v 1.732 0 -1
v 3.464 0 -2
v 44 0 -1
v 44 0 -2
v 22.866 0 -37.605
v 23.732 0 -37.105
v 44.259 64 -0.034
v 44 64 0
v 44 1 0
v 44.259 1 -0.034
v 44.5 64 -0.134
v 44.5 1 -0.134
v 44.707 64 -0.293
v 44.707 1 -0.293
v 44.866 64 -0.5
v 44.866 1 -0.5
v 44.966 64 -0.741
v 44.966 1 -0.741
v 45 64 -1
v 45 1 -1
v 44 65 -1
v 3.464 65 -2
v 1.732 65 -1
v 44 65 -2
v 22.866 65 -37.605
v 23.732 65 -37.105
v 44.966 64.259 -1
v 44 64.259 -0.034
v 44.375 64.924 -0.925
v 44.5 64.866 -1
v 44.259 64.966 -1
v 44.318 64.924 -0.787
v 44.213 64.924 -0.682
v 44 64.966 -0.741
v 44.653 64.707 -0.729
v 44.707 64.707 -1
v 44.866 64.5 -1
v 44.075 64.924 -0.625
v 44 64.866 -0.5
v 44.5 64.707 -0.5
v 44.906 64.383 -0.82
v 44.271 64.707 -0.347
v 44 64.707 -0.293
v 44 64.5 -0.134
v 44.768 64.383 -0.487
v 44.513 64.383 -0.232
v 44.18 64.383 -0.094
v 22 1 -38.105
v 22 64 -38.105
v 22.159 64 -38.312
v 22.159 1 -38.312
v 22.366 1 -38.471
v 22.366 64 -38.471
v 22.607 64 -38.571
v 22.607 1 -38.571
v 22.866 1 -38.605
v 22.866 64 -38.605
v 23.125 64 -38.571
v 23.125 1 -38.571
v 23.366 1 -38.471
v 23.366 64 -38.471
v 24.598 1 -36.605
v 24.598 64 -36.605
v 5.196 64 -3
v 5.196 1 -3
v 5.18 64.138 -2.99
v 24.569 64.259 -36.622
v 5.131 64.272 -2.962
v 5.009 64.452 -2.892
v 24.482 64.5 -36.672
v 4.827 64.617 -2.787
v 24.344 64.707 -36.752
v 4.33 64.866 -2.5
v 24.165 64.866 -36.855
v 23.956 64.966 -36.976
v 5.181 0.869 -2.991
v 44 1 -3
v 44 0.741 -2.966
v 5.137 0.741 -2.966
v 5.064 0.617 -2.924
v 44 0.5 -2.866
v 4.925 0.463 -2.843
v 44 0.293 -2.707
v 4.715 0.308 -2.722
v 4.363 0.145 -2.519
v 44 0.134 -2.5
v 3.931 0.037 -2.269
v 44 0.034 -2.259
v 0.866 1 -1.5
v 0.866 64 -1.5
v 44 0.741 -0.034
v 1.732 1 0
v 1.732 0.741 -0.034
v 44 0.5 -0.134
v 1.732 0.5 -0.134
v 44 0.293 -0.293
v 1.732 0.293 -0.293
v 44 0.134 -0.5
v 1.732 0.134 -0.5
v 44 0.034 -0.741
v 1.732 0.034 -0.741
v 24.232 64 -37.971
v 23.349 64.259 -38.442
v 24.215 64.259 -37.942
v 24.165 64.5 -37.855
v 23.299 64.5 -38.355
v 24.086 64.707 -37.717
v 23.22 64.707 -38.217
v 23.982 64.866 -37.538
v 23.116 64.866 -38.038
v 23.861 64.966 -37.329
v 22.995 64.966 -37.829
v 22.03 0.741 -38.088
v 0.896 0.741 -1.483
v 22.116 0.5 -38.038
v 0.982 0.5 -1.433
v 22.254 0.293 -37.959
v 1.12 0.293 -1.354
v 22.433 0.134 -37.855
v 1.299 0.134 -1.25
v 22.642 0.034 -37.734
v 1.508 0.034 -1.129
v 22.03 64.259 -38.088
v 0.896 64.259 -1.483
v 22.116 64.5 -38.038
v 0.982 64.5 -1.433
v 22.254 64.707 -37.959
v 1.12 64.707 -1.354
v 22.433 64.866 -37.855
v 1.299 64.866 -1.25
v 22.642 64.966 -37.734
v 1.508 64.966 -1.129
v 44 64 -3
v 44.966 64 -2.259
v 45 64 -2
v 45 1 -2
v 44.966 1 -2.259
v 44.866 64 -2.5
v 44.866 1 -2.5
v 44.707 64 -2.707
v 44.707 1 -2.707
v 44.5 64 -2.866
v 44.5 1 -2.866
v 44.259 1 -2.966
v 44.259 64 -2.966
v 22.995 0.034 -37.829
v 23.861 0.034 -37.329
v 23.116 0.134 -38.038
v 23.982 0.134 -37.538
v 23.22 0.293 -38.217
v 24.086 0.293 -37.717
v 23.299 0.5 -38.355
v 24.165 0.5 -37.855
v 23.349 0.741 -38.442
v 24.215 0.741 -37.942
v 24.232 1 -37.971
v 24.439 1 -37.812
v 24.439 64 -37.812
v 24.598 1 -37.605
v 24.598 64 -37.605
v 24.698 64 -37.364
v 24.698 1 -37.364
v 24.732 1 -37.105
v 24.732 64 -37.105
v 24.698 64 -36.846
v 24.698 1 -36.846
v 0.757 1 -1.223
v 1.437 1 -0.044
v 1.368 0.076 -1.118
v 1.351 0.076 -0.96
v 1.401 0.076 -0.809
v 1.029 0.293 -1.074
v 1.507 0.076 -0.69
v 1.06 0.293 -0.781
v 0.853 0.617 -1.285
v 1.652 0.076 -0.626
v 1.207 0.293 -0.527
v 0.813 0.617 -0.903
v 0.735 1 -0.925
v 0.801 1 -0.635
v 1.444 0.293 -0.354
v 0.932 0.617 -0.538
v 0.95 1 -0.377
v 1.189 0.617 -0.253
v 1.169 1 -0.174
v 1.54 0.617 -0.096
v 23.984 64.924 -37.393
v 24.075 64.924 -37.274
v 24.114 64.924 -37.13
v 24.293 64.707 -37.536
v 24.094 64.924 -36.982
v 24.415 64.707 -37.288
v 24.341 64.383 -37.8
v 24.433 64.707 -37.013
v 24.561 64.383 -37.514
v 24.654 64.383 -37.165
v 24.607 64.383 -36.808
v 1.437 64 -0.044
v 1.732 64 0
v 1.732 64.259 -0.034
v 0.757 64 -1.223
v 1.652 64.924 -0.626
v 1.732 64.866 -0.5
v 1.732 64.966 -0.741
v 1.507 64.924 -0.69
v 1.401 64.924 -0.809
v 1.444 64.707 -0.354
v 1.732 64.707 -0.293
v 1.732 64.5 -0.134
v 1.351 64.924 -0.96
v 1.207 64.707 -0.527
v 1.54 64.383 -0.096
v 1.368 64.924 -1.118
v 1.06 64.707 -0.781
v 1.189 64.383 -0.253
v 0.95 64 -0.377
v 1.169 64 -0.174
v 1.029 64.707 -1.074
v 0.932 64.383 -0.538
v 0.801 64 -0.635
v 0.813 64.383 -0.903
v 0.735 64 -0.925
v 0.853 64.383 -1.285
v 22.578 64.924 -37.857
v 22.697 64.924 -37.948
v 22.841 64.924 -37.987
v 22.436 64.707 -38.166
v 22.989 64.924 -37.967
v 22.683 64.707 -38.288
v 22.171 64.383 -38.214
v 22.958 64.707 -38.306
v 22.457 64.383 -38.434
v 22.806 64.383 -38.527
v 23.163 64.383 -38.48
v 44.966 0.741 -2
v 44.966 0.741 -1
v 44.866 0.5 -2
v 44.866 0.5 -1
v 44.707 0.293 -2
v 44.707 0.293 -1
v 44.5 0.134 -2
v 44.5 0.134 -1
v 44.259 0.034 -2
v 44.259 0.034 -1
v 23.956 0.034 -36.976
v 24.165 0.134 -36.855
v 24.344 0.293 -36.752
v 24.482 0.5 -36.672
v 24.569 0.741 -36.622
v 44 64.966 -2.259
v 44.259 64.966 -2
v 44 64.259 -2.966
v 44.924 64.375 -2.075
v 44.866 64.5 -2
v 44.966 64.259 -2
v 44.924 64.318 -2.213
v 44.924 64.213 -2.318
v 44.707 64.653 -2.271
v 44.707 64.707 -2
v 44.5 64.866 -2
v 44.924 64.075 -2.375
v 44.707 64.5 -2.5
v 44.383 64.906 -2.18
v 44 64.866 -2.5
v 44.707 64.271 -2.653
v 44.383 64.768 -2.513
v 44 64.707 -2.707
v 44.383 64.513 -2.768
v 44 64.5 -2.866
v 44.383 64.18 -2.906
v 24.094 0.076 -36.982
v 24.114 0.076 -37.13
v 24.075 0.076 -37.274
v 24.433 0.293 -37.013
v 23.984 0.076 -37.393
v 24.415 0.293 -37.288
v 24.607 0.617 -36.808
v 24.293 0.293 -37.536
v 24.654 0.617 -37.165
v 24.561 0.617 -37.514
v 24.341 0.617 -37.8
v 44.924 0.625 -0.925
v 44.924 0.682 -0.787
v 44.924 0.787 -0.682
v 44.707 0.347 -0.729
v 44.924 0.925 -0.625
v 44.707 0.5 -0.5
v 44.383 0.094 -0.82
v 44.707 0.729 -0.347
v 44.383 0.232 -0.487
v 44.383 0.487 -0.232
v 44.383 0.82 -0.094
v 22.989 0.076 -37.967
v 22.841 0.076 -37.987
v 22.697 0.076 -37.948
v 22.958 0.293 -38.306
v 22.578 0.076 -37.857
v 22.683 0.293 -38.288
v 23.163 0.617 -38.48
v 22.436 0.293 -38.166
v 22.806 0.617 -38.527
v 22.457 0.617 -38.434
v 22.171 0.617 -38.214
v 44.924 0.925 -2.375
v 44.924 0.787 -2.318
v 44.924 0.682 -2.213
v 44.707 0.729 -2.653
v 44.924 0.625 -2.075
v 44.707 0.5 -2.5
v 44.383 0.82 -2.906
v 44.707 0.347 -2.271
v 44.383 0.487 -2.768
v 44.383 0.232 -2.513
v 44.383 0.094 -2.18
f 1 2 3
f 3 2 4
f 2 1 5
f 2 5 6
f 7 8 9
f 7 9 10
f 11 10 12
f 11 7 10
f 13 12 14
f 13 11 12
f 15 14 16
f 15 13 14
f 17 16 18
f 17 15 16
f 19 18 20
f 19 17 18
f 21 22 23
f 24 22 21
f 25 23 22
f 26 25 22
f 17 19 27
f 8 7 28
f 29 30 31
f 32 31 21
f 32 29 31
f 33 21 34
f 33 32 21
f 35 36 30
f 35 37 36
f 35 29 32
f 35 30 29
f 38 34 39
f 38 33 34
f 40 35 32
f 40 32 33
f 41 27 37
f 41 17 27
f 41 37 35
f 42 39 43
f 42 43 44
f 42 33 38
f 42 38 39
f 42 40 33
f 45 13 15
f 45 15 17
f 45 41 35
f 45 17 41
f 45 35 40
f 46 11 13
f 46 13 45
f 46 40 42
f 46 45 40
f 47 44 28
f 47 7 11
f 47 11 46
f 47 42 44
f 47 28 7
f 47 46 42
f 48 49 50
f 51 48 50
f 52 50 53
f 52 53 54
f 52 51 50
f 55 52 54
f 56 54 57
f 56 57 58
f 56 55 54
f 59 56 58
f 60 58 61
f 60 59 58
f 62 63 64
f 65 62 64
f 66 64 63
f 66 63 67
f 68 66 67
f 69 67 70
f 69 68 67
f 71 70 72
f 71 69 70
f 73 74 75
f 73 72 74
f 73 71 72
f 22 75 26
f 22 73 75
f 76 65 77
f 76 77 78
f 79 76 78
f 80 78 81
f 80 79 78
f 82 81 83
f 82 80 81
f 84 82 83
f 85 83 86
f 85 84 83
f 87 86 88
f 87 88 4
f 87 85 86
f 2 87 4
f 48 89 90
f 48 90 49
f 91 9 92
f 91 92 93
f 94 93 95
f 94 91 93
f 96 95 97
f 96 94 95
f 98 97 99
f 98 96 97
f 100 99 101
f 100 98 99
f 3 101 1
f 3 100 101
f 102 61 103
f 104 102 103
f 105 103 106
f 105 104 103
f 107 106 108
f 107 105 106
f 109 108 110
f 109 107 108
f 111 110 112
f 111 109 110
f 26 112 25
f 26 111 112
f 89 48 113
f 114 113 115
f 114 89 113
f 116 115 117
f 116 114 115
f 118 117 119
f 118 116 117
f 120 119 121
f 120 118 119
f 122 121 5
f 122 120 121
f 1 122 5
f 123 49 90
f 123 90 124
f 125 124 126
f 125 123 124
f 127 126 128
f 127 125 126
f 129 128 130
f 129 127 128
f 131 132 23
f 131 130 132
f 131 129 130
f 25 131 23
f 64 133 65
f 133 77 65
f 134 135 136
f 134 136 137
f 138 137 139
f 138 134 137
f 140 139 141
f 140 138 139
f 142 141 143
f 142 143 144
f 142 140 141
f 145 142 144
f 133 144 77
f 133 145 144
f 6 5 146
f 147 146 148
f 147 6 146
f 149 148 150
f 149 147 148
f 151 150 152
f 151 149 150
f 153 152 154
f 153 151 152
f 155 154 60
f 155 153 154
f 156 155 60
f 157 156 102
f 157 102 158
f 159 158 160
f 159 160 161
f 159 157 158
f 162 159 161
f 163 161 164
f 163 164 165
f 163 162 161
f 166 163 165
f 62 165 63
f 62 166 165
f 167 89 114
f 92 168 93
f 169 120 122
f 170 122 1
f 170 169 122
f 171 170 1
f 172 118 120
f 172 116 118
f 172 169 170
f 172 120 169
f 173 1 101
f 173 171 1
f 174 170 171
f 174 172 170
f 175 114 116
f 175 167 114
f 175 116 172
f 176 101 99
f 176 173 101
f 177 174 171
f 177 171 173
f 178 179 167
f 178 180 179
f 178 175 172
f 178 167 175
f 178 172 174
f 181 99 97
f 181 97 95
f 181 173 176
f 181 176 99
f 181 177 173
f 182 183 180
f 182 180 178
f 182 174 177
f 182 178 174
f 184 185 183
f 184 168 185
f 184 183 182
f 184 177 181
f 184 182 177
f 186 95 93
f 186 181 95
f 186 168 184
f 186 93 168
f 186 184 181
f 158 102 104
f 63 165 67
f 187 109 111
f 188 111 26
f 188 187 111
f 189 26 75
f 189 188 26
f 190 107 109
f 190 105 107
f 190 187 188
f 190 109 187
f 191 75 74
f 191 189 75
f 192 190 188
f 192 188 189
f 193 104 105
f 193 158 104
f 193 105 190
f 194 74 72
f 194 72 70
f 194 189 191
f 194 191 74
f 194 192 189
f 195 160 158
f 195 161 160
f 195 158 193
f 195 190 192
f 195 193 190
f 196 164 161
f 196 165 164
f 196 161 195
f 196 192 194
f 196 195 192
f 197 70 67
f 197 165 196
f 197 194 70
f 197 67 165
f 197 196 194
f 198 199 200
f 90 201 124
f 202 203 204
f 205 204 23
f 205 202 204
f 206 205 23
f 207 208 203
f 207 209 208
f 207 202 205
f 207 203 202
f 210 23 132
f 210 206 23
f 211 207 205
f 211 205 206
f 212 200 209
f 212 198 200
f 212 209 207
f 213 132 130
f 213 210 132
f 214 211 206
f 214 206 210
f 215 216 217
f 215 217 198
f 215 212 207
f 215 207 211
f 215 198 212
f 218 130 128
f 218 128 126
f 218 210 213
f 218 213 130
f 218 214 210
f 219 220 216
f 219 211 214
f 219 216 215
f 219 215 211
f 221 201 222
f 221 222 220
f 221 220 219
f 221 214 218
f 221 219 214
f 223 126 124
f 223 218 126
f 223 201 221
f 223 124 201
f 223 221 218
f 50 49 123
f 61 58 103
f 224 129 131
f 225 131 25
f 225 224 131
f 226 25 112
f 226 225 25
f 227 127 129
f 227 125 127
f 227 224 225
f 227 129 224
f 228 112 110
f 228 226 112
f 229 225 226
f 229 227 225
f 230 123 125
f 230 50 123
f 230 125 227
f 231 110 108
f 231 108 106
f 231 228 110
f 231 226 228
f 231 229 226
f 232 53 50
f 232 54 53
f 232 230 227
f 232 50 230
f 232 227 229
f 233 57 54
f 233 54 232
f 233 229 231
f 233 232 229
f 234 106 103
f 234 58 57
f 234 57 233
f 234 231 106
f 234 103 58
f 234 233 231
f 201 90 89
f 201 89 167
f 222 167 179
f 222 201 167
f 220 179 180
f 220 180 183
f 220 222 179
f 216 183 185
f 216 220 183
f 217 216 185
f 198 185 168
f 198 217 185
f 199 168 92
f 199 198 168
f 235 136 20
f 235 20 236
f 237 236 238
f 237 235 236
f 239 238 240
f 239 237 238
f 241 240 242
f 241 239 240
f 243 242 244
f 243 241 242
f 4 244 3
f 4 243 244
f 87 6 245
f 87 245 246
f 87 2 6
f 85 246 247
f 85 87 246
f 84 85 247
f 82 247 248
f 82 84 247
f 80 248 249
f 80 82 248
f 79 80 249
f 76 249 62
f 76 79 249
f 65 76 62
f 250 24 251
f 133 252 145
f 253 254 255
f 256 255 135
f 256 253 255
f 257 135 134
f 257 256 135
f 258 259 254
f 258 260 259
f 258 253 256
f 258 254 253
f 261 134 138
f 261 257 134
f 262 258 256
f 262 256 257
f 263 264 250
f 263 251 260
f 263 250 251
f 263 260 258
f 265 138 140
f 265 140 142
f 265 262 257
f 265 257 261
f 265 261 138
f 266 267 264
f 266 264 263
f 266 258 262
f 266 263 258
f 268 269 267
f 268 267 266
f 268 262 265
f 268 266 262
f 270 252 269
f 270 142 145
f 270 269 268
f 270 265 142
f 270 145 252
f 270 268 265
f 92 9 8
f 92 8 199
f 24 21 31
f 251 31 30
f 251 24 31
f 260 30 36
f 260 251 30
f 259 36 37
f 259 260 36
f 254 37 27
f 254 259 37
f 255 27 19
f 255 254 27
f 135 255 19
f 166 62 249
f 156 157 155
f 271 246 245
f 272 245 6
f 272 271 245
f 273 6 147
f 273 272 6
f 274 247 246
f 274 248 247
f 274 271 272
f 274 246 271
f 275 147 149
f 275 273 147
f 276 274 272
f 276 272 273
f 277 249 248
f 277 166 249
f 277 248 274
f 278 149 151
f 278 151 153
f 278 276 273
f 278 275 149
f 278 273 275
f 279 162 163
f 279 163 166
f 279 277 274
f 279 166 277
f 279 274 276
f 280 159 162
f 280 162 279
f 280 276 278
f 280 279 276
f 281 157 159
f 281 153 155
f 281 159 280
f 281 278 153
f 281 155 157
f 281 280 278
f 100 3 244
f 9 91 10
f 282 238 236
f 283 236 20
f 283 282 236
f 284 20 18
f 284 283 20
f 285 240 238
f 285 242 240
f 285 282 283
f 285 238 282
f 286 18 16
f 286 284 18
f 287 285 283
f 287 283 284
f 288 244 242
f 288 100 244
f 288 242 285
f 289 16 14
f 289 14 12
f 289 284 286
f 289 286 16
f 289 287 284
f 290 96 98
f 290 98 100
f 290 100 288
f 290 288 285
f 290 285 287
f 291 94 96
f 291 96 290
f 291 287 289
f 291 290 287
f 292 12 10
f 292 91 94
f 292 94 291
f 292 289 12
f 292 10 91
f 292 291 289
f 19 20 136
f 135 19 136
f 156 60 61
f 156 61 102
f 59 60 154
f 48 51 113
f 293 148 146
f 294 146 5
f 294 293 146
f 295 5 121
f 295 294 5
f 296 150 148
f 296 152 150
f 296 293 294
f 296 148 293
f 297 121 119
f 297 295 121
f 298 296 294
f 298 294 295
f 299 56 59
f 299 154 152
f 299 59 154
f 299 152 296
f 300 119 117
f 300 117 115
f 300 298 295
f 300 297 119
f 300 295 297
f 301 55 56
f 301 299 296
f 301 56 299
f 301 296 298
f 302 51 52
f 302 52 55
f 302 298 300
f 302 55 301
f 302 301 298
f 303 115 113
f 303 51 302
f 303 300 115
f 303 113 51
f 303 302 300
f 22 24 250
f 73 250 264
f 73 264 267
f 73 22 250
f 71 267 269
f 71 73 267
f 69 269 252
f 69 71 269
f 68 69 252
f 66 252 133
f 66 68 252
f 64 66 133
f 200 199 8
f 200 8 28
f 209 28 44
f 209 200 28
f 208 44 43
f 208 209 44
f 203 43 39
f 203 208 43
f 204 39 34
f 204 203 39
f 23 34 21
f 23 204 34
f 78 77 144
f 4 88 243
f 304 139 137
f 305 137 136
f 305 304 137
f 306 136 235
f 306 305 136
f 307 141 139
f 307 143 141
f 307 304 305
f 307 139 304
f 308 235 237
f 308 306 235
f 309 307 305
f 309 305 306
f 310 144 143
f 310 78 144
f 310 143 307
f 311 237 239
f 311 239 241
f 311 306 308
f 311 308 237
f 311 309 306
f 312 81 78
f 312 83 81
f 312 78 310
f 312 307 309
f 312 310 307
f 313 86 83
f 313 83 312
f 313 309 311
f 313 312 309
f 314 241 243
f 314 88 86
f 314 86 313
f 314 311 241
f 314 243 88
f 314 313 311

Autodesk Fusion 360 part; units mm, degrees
sketch "Sketch1" plane through (0, 0, 0) normal (0, 1, 0) x (1, 0, 0)
  line L0 (0, 0) -> (22.5, 38.9711)
  line L1 (0, 0) -> (45, 0) construction
  line L2 (22.5, 38.9711) -> (25.0981, 37.4711)
  line L3 (22.5, 38.9711) -> (25.5, 38.9711) construction
  line L4 (25.0981, 37.4711) -> (3.4641, 0)
  line L5 (25.0981, 37.4711) -> (68.366, 37.4711) construction
  line L6 (0, 0) -> (45, 0)
  line L7 (45, 0) -> (45, 3)
  line L8 (45, 3) -> (1.7321, 3)
  dimension "d1" = 45
  dimension "d2" = 60
  dimension "d3" = 30
  dimension "d4" = 3
  dimension "d5" = 120
  dimension "d6" = 45
  dimension "d7" = 3
extrude "Extrude1" add sketch "Sketch1" along normal blind 45
extrude "Extrude2" add 1 faces at (9.2321, 45, -13.9904) along direction (0, 1, 0) blind 20
fillet "Fillet1" radius 1 17 edges at (0, 32.5, 0) (22.5, 32.5, -38.9711) (11.25, 65, -19.4856) (11.25, 0, -19.4856) (22.5, 0, 0) (45, 32.5, 0) (22.5, 65, 0) (15.1471, 65, -20.2356) (25.0981, 65, -3) (15.1471, 0, -20.2356) (25.0981, 0, -3) (25.0981, 32.5, -37.4711) (23.799, 65, -38.2211) (23.799, 0, -38.2211) (45, 65, -1.5) (45, 32.5, -3) (45, 0, -1.5)
